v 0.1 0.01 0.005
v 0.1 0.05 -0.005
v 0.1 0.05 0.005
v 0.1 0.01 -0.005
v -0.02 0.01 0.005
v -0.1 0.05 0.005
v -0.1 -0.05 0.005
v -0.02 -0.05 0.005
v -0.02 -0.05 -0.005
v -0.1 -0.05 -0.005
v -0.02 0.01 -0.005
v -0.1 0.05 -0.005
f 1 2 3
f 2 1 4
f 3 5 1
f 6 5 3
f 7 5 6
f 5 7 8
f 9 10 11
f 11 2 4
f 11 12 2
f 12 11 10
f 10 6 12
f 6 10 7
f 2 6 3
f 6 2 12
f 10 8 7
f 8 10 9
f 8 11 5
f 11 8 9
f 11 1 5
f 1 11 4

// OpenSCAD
$fn=64;

module l_bracket(L=0.2, W=0.1, T=0.01, stepL=0.12, stepW=0.06) {
    difference() {
        translate([-L/2, -W/2, -T/2])
            cube([L, W, T], center=false);

        translate([L/2 - stepL, -W/2, -T/2 - 0.001])
            cube([stepL, stepW, T + 0.002], center=false);
    }
}

l_bracket(L=0.2, W=0.1, T=0.01, stepL=0.12, stepW=0.06);
